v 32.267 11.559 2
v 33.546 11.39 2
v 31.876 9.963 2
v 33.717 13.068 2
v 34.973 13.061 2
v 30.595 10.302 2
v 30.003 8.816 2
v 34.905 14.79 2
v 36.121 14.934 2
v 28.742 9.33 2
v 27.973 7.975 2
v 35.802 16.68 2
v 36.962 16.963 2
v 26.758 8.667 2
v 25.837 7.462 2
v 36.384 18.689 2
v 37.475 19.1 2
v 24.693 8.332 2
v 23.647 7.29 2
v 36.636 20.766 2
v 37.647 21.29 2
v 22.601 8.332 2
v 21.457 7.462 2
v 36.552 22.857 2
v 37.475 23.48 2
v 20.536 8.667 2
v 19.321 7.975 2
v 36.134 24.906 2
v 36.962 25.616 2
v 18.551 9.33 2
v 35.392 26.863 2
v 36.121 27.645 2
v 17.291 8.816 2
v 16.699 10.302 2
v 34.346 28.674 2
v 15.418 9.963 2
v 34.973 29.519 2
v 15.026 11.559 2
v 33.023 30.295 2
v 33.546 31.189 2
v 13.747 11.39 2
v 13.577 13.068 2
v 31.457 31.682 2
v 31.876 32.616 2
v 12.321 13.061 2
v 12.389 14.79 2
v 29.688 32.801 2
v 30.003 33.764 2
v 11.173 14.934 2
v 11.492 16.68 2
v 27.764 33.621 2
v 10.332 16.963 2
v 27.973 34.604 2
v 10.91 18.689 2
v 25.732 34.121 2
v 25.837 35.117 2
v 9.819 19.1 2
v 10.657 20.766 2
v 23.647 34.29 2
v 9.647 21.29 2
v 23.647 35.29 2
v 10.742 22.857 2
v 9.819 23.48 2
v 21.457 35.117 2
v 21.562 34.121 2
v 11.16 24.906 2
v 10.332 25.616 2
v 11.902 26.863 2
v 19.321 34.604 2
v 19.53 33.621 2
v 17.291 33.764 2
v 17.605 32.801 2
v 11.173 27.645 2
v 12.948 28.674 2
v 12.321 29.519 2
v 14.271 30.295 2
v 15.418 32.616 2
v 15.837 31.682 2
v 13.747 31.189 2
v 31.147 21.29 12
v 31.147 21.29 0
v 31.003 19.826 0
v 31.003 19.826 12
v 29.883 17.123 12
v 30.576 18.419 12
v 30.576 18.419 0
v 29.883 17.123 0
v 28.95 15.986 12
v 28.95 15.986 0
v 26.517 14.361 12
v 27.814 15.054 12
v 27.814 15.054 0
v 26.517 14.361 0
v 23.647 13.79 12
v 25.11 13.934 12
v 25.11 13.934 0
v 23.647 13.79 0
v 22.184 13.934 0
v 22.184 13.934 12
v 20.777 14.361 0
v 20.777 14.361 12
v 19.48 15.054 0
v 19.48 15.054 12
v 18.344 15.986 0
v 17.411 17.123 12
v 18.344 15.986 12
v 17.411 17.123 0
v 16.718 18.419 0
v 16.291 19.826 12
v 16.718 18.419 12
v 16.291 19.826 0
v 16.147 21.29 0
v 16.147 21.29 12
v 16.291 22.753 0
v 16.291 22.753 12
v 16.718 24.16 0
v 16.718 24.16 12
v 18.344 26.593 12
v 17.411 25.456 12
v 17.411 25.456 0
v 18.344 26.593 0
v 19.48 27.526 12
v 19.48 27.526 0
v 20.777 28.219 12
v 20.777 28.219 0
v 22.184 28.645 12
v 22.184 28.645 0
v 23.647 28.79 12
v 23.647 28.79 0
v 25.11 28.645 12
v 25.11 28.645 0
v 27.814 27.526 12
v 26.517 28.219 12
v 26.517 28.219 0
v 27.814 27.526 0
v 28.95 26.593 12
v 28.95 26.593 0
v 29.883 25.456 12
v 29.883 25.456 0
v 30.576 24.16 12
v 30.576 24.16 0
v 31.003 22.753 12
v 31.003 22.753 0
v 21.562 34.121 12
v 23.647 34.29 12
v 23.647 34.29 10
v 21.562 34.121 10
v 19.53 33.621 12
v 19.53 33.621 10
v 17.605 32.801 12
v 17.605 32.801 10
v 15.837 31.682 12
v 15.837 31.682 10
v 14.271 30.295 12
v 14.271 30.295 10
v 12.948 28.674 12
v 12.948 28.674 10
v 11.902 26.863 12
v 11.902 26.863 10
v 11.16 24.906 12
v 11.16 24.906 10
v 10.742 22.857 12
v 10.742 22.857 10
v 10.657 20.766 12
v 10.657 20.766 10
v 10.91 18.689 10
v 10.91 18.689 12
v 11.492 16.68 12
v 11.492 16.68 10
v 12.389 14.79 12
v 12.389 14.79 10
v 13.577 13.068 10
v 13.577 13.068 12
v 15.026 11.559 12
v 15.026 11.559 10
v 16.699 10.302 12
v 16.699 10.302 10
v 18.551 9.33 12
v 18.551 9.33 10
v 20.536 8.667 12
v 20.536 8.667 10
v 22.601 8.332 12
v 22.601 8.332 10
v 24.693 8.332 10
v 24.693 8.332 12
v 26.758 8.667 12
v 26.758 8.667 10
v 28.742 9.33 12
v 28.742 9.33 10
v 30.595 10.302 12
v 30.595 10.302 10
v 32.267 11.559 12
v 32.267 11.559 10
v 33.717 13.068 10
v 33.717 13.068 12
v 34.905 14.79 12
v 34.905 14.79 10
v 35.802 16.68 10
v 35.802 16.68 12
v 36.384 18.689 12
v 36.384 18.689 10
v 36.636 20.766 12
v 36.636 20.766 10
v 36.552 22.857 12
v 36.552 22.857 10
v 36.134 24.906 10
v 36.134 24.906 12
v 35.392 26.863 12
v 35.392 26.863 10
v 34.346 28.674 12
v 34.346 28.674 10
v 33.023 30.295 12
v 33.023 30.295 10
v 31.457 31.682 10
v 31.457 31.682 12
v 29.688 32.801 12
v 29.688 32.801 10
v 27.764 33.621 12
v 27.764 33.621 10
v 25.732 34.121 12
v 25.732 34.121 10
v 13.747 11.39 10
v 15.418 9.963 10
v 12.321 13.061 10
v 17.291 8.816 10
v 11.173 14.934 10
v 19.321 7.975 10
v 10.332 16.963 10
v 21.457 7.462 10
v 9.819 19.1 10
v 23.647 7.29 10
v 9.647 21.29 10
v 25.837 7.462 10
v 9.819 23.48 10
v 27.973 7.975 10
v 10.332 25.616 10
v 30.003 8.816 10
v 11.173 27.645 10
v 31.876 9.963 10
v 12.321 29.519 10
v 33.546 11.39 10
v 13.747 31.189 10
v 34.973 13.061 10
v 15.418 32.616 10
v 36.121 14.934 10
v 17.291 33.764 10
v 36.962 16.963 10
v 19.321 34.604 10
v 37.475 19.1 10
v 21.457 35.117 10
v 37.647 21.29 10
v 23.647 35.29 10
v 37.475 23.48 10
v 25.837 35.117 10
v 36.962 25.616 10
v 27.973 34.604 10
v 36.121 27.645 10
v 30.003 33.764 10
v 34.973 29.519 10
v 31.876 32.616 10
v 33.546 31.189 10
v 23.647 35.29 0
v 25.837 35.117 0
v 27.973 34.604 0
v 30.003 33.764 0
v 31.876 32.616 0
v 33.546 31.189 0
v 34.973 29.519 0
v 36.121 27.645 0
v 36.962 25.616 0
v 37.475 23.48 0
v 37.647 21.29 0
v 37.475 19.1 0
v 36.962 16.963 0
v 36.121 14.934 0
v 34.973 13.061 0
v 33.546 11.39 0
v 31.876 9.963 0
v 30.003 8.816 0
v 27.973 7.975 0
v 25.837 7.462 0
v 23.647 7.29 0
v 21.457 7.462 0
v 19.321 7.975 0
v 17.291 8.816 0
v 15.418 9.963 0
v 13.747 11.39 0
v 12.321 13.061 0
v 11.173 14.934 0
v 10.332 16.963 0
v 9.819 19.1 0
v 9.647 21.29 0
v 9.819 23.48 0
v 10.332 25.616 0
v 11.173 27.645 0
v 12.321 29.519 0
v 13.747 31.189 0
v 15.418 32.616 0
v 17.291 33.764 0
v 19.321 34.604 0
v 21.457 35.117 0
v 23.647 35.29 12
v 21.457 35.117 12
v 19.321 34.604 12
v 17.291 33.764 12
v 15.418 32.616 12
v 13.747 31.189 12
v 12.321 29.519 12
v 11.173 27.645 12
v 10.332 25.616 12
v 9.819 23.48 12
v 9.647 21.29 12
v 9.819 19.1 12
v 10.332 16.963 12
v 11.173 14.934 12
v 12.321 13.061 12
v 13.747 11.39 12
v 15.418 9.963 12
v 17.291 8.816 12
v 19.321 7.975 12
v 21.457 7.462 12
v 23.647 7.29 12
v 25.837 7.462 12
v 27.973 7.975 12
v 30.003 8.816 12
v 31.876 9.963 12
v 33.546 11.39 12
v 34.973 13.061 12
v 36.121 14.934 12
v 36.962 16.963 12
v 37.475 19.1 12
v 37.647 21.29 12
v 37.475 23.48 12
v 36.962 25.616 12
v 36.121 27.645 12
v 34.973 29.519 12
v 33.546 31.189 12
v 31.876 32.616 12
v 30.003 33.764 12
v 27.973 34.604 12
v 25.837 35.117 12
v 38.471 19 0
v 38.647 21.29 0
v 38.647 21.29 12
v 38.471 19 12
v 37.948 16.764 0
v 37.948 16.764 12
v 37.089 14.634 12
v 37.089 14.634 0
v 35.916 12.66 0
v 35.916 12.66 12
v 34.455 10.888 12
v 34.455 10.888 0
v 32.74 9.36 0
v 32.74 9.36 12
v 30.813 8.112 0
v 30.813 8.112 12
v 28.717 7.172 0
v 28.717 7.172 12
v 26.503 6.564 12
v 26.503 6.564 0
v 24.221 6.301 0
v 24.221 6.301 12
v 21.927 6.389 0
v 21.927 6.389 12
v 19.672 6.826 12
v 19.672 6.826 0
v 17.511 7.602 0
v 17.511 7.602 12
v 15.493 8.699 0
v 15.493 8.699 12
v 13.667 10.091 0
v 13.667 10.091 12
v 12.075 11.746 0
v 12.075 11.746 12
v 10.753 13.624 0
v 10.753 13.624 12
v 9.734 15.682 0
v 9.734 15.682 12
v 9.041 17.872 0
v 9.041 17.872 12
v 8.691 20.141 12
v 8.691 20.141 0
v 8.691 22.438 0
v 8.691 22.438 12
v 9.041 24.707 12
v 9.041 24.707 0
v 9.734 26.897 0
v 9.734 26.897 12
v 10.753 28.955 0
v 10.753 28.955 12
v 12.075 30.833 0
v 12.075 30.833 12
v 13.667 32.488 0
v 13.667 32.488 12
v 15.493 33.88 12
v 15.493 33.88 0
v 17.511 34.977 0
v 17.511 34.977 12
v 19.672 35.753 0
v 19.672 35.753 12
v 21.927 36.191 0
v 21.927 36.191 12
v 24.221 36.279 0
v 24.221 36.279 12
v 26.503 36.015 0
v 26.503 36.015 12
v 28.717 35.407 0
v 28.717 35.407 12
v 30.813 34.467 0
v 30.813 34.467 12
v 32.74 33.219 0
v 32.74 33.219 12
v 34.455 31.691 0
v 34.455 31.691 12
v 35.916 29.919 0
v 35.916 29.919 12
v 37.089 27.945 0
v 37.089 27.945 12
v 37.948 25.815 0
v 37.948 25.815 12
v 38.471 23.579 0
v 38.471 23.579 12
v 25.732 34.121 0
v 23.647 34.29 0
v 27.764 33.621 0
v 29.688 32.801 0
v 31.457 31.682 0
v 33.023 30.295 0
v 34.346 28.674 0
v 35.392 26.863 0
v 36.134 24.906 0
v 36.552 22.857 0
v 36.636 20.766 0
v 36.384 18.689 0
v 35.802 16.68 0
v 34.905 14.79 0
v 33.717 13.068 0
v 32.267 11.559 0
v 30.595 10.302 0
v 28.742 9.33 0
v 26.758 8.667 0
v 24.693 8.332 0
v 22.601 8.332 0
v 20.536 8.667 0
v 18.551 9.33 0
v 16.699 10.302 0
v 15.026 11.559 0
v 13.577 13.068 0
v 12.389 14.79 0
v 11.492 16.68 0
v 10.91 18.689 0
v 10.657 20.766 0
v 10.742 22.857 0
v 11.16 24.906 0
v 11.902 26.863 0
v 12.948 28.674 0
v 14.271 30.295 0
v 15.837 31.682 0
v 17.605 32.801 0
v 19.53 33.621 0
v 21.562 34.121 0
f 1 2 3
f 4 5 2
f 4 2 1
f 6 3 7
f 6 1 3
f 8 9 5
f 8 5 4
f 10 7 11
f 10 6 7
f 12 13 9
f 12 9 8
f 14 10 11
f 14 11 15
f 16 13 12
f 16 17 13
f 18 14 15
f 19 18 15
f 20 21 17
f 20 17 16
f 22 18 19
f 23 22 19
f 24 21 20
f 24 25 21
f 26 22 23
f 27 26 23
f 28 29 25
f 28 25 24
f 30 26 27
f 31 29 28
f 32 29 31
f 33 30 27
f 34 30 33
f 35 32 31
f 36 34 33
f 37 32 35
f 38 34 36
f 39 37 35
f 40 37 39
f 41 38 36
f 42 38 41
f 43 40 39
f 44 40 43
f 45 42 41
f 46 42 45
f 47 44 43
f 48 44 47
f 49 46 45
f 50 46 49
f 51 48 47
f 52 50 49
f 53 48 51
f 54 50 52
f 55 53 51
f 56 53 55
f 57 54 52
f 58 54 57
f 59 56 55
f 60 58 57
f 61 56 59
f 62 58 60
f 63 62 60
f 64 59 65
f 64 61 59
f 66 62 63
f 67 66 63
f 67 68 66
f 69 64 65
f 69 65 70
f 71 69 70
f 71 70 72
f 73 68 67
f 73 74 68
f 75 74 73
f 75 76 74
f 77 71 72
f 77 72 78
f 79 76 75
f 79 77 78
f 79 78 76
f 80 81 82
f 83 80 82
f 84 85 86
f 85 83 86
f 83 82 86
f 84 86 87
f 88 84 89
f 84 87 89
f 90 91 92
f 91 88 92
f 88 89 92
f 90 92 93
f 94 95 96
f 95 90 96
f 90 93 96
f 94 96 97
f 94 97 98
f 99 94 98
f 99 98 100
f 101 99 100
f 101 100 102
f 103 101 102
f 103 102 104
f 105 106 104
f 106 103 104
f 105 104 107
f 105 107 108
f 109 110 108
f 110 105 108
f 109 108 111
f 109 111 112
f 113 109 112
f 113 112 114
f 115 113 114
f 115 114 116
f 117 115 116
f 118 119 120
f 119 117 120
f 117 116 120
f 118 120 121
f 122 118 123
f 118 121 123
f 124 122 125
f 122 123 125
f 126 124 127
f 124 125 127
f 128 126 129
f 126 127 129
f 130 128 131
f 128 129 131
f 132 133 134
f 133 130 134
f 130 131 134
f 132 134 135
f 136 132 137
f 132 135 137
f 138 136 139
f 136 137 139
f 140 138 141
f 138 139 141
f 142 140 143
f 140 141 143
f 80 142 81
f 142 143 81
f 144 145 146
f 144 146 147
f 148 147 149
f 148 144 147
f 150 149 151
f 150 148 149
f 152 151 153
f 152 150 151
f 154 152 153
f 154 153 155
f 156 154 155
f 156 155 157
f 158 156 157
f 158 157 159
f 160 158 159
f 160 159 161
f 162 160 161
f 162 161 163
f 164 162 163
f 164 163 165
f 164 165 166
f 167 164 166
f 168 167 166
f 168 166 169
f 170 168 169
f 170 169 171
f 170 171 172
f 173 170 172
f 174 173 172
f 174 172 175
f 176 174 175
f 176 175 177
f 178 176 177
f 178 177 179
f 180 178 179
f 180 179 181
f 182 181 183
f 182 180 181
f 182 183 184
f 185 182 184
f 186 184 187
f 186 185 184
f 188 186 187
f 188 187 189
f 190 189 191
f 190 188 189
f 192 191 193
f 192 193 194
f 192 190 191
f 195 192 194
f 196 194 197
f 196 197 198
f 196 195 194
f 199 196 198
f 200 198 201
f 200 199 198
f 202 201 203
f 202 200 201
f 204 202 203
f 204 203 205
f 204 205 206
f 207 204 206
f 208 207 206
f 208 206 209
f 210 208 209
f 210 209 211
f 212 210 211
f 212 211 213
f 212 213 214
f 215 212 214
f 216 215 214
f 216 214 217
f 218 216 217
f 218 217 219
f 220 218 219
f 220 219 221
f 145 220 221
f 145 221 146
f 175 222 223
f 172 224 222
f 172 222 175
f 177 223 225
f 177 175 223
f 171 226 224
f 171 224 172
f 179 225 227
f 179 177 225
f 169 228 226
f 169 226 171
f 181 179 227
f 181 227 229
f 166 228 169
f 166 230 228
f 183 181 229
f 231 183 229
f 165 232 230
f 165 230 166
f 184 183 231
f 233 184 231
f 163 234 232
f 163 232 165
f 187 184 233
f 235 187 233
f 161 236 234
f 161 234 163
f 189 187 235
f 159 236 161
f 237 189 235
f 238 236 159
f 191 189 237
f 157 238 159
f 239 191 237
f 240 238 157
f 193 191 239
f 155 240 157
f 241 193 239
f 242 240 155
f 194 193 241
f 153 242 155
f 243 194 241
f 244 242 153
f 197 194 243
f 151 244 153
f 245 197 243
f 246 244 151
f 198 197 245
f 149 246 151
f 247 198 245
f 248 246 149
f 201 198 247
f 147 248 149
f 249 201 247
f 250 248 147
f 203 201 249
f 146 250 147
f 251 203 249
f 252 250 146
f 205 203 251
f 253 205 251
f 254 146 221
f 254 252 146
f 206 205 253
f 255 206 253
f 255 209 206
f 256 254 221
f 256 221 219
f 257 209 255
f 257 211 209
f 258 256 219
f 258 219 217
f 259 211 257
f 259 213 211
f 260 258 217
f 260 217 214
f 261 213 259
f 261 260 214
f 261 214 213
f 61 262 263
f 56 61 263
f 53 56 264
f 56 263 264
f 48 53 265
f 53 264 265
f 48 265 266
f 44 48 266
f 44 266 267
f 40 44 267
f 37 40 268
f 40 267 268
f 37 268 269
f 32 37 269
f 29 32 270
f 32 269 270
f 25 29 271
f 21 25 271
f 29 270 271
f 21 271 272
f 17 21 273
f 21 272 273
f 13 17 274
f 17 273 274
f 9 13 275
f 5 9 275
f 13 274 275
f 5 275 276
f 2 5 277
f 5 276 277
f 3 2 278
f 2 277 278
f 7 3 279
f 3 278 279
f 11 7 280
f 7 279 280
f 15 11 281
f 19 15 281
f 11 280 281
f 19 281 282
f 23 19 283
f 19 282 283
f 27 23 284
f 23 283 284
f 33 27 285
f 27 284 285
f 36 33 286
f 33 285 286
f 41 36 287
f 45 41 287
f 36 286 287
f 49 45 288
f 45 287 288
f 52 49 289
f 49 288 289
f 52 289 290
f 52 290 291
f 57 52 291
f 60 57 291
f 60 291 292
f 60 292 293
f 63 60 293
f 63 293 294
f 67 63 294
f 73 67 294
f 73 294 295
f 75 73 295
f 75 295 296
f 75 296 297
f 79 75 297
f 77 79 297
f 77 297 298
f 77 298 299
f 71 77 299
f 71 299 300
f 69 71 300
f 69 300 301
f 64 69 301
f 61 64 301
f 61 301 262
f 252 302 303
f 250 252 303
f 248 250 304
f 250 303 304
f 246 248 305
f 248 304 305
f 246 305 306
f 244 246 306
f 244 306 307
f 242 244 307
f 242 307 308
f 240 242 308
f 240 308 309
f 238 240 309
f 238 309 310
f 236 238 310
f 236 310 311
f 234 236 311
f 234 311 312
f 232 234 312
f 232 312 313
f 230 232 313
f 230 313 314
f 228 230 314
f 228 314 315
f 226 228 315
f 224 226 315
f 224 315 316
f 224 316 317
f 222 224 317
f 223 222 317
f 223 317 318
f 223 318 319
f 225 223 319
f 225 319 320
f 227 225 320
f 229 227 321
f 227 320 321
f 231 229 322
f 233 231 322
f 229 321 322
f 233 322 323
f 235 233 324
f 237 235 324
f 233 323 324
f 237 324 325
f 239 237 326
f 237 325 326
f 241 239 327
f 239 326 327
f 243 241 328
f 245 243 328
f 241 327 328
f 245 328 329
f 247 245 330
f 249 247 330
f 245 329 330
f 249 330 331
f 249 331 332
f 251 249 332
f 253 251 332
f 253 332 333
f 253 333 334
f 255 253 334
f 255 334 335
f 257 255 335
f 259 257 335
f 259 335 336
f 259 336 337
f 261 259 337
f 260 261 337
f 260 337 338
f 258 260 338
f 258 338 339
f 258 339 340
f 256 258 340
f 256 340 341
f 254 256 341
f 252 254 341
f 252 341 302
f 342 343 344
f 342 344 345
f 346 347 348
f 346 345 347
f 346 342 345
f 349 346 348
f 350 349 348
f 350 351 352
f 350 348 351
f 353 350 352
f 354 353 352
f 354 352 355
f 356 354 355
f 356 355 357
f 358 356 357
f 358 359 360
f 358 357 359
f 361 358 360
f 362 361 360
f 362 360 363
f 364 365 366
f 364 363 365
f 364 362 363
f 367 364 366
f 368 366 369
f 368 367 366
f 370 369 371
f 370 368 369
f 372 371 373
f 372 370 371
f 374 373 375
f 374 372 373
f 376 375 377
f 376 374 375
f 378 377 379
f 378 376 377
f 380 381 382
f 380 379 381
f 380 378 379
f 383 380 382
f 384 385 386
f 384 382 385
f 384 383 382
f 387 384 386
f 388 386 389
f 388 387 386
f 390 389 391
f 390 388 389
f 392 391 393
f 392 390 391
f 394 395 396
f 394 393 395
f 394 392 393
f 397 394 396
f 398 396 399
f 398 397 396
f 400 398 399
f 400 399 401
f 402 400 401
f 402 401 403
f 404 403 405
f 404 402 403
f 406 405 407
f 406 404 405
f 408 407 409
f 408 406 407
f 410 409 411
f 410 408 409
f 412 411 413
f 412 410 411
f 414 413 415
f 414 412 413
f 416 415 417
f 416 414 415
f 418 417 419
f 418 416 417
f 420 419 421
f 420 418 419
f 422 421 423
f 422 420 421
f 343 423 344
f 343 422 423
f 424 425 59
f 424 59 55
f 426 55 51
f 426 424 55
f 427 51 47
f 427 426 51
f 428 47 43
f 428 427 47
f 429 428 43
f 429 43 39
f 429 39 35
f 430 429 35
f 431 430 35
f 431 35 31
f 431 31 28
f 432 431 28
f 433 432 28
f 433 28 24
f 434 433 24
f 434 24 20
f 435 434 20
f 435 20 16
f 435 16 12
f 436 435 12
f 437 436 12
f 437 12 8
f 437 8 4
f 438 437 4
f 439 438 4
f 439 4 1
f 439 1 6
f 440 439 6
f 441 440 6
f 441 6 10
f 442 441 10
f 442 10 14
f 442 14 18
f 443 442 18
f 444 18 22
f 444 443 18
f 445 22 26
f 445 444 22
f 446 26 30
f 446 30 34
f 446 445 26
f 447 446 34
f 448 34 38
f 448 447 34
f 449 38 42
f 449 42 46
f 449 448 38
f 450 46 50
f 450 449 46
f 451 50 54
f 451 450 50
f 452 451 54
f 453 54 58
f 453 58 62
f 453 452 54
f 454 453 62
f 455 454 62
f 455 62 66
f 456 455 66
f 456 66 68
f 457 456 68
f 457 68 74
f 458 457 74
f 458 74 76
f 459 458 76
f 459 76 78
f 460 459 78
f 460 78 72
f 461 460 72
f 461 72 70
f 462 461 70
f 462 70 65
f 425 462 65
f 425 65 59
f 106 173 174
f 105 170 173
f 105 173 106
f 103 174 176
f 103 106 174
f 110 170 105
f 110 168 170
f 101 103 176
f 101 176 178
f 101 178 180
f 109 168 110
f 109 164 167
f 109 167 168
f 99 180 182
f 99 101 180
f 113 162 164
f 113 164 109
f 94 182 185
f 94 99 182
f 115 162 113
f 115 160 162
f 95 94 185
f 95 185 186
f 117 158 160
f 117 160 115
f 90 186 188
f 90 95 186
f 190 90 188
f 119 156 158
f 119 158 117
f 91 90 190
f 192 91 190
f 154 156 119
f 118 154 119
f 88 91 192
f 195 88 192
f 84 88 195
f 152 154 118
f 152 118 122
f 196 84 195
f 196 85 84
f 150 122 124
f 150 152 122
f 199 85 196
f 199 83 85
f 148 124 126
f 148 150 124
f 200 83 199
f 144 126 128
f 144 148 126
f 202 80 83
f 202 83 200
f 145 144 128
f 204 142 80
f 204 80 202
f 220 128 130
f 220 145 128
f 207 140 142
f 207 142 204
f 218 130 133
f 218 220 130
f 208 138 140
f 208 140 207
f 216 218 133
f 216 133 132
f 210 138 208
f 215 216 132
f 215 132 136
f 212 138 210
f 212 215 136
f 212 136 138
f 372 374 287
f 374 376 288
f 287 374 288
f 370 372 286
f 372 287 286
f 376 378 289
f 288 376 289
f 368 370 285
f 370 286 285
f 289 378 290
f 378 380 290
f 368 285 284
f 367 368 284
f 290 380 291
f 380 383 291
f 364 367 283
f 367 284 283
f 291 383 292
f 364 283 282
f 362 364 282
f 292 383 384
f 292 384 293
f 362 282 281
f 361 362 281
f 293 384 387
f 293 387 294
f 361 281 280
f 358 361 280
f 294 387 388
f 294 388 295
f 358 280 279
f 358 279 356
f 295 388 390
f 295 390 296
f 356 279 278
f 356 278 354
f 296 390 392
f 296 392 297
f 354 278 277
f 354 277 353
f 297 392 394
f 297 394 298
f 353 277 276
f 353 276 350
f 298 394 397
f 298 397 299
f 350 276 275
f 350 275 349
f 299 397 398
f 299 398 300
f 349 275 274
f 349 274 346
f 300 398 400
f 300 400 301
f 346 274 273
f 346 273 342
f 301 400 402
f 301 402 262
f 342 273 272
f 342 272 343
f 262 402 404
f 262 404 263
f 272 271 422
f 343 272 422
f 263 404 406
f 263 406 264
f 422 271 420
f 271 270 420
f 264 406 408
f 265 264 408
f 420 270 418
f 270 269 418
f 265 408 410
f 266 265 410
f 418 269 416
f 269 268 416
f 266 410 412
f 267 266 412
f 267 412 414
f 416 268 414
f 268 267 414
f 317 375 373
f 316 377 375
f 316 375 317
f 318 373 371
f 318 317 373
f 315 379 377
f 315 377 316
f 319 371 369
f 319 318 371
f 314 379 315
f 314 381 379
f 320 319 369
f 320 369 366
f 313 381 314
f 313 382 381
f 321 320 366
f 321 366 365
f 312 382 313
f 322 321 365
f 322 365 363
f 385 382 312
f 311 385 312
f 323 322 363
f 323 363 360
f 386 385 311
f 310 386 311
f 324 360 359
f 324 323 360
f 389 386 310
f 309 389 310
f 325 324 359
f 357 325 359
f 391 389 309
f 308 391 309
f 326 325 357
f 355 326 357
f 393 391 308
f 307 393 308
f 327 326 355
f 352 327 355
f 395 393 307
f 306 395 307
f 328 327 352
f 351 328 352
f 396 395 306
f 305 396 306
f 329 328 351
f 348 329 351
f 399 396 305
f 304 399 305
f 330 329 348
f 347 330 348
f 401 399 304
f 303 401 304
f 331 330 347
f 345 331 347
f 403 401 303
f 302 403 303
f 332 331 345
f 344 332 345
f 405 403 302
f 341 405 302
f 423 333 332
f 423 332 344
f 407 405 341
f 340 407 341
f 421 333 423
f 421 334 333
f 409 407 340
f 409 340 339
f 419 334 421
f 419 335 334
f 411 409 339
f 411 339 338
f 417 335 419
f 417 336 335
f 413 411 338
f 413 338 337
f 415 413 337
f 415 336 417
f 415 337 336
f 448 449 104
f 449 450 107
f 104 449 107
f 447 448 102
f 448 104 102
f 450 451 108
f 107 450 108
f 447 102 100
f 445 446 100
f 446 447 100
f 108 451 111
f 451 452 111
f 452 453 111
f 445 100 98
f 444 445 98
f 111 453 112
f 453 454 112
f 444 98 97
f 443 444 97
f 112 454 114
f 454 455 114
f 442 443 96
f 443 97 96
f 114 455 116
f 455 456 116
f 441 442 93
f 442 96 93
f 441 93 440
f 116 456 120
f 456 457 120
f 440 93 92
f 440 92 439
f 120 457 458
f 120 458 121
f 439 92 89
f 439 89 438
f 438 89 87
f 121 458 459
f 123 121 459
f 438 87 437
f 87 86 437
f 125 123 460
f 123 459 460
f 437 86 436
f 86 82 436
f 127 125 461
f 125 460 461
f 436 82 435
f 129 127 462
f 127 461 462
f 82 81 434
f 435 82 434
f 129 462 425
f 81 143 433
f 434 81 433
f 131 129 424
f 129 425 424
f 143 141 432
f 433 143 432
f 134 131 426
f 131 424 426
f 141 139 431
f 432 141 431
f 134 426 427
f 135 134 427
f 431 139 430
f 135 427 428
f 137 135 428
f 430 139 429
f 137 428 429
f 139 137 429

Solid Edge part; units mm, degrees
sketch "Sketch1" plane through (0, 0, 0) normal (0, 0, 1) x (1, 0, 0)
  circle A0 centre (23.6469, 21.2896) radius 15
  circle A1 centre (23.6469, 21.2896) radius 7.5
extrude "ExtrudedProtrusion_1" add sketch "Sketch1" along normal blind 12
sketch "Sketch2" plane through (23.6469, 21.2896, 12) normal (0, 0, 1) x (0, 1, 0)
  circle A0 centre (0, 0) radius 14
  circle A1 centre (0, 0) radius 13
extrude "ExtrudedCutout_1" cut sketch "Sketch2" against normal blind 2
sketch "Sketch3" plane through (23.6469, 21.2896, 0) normal (0, 0, -1) x (0, 1, 0)
  circle A0 centre (0, 0) radius 14
  circle A1 centre (0, 0) radius 13
extrude "ExtrudedCutout_2" cut sketch "Sketch3" against normal blind 2
